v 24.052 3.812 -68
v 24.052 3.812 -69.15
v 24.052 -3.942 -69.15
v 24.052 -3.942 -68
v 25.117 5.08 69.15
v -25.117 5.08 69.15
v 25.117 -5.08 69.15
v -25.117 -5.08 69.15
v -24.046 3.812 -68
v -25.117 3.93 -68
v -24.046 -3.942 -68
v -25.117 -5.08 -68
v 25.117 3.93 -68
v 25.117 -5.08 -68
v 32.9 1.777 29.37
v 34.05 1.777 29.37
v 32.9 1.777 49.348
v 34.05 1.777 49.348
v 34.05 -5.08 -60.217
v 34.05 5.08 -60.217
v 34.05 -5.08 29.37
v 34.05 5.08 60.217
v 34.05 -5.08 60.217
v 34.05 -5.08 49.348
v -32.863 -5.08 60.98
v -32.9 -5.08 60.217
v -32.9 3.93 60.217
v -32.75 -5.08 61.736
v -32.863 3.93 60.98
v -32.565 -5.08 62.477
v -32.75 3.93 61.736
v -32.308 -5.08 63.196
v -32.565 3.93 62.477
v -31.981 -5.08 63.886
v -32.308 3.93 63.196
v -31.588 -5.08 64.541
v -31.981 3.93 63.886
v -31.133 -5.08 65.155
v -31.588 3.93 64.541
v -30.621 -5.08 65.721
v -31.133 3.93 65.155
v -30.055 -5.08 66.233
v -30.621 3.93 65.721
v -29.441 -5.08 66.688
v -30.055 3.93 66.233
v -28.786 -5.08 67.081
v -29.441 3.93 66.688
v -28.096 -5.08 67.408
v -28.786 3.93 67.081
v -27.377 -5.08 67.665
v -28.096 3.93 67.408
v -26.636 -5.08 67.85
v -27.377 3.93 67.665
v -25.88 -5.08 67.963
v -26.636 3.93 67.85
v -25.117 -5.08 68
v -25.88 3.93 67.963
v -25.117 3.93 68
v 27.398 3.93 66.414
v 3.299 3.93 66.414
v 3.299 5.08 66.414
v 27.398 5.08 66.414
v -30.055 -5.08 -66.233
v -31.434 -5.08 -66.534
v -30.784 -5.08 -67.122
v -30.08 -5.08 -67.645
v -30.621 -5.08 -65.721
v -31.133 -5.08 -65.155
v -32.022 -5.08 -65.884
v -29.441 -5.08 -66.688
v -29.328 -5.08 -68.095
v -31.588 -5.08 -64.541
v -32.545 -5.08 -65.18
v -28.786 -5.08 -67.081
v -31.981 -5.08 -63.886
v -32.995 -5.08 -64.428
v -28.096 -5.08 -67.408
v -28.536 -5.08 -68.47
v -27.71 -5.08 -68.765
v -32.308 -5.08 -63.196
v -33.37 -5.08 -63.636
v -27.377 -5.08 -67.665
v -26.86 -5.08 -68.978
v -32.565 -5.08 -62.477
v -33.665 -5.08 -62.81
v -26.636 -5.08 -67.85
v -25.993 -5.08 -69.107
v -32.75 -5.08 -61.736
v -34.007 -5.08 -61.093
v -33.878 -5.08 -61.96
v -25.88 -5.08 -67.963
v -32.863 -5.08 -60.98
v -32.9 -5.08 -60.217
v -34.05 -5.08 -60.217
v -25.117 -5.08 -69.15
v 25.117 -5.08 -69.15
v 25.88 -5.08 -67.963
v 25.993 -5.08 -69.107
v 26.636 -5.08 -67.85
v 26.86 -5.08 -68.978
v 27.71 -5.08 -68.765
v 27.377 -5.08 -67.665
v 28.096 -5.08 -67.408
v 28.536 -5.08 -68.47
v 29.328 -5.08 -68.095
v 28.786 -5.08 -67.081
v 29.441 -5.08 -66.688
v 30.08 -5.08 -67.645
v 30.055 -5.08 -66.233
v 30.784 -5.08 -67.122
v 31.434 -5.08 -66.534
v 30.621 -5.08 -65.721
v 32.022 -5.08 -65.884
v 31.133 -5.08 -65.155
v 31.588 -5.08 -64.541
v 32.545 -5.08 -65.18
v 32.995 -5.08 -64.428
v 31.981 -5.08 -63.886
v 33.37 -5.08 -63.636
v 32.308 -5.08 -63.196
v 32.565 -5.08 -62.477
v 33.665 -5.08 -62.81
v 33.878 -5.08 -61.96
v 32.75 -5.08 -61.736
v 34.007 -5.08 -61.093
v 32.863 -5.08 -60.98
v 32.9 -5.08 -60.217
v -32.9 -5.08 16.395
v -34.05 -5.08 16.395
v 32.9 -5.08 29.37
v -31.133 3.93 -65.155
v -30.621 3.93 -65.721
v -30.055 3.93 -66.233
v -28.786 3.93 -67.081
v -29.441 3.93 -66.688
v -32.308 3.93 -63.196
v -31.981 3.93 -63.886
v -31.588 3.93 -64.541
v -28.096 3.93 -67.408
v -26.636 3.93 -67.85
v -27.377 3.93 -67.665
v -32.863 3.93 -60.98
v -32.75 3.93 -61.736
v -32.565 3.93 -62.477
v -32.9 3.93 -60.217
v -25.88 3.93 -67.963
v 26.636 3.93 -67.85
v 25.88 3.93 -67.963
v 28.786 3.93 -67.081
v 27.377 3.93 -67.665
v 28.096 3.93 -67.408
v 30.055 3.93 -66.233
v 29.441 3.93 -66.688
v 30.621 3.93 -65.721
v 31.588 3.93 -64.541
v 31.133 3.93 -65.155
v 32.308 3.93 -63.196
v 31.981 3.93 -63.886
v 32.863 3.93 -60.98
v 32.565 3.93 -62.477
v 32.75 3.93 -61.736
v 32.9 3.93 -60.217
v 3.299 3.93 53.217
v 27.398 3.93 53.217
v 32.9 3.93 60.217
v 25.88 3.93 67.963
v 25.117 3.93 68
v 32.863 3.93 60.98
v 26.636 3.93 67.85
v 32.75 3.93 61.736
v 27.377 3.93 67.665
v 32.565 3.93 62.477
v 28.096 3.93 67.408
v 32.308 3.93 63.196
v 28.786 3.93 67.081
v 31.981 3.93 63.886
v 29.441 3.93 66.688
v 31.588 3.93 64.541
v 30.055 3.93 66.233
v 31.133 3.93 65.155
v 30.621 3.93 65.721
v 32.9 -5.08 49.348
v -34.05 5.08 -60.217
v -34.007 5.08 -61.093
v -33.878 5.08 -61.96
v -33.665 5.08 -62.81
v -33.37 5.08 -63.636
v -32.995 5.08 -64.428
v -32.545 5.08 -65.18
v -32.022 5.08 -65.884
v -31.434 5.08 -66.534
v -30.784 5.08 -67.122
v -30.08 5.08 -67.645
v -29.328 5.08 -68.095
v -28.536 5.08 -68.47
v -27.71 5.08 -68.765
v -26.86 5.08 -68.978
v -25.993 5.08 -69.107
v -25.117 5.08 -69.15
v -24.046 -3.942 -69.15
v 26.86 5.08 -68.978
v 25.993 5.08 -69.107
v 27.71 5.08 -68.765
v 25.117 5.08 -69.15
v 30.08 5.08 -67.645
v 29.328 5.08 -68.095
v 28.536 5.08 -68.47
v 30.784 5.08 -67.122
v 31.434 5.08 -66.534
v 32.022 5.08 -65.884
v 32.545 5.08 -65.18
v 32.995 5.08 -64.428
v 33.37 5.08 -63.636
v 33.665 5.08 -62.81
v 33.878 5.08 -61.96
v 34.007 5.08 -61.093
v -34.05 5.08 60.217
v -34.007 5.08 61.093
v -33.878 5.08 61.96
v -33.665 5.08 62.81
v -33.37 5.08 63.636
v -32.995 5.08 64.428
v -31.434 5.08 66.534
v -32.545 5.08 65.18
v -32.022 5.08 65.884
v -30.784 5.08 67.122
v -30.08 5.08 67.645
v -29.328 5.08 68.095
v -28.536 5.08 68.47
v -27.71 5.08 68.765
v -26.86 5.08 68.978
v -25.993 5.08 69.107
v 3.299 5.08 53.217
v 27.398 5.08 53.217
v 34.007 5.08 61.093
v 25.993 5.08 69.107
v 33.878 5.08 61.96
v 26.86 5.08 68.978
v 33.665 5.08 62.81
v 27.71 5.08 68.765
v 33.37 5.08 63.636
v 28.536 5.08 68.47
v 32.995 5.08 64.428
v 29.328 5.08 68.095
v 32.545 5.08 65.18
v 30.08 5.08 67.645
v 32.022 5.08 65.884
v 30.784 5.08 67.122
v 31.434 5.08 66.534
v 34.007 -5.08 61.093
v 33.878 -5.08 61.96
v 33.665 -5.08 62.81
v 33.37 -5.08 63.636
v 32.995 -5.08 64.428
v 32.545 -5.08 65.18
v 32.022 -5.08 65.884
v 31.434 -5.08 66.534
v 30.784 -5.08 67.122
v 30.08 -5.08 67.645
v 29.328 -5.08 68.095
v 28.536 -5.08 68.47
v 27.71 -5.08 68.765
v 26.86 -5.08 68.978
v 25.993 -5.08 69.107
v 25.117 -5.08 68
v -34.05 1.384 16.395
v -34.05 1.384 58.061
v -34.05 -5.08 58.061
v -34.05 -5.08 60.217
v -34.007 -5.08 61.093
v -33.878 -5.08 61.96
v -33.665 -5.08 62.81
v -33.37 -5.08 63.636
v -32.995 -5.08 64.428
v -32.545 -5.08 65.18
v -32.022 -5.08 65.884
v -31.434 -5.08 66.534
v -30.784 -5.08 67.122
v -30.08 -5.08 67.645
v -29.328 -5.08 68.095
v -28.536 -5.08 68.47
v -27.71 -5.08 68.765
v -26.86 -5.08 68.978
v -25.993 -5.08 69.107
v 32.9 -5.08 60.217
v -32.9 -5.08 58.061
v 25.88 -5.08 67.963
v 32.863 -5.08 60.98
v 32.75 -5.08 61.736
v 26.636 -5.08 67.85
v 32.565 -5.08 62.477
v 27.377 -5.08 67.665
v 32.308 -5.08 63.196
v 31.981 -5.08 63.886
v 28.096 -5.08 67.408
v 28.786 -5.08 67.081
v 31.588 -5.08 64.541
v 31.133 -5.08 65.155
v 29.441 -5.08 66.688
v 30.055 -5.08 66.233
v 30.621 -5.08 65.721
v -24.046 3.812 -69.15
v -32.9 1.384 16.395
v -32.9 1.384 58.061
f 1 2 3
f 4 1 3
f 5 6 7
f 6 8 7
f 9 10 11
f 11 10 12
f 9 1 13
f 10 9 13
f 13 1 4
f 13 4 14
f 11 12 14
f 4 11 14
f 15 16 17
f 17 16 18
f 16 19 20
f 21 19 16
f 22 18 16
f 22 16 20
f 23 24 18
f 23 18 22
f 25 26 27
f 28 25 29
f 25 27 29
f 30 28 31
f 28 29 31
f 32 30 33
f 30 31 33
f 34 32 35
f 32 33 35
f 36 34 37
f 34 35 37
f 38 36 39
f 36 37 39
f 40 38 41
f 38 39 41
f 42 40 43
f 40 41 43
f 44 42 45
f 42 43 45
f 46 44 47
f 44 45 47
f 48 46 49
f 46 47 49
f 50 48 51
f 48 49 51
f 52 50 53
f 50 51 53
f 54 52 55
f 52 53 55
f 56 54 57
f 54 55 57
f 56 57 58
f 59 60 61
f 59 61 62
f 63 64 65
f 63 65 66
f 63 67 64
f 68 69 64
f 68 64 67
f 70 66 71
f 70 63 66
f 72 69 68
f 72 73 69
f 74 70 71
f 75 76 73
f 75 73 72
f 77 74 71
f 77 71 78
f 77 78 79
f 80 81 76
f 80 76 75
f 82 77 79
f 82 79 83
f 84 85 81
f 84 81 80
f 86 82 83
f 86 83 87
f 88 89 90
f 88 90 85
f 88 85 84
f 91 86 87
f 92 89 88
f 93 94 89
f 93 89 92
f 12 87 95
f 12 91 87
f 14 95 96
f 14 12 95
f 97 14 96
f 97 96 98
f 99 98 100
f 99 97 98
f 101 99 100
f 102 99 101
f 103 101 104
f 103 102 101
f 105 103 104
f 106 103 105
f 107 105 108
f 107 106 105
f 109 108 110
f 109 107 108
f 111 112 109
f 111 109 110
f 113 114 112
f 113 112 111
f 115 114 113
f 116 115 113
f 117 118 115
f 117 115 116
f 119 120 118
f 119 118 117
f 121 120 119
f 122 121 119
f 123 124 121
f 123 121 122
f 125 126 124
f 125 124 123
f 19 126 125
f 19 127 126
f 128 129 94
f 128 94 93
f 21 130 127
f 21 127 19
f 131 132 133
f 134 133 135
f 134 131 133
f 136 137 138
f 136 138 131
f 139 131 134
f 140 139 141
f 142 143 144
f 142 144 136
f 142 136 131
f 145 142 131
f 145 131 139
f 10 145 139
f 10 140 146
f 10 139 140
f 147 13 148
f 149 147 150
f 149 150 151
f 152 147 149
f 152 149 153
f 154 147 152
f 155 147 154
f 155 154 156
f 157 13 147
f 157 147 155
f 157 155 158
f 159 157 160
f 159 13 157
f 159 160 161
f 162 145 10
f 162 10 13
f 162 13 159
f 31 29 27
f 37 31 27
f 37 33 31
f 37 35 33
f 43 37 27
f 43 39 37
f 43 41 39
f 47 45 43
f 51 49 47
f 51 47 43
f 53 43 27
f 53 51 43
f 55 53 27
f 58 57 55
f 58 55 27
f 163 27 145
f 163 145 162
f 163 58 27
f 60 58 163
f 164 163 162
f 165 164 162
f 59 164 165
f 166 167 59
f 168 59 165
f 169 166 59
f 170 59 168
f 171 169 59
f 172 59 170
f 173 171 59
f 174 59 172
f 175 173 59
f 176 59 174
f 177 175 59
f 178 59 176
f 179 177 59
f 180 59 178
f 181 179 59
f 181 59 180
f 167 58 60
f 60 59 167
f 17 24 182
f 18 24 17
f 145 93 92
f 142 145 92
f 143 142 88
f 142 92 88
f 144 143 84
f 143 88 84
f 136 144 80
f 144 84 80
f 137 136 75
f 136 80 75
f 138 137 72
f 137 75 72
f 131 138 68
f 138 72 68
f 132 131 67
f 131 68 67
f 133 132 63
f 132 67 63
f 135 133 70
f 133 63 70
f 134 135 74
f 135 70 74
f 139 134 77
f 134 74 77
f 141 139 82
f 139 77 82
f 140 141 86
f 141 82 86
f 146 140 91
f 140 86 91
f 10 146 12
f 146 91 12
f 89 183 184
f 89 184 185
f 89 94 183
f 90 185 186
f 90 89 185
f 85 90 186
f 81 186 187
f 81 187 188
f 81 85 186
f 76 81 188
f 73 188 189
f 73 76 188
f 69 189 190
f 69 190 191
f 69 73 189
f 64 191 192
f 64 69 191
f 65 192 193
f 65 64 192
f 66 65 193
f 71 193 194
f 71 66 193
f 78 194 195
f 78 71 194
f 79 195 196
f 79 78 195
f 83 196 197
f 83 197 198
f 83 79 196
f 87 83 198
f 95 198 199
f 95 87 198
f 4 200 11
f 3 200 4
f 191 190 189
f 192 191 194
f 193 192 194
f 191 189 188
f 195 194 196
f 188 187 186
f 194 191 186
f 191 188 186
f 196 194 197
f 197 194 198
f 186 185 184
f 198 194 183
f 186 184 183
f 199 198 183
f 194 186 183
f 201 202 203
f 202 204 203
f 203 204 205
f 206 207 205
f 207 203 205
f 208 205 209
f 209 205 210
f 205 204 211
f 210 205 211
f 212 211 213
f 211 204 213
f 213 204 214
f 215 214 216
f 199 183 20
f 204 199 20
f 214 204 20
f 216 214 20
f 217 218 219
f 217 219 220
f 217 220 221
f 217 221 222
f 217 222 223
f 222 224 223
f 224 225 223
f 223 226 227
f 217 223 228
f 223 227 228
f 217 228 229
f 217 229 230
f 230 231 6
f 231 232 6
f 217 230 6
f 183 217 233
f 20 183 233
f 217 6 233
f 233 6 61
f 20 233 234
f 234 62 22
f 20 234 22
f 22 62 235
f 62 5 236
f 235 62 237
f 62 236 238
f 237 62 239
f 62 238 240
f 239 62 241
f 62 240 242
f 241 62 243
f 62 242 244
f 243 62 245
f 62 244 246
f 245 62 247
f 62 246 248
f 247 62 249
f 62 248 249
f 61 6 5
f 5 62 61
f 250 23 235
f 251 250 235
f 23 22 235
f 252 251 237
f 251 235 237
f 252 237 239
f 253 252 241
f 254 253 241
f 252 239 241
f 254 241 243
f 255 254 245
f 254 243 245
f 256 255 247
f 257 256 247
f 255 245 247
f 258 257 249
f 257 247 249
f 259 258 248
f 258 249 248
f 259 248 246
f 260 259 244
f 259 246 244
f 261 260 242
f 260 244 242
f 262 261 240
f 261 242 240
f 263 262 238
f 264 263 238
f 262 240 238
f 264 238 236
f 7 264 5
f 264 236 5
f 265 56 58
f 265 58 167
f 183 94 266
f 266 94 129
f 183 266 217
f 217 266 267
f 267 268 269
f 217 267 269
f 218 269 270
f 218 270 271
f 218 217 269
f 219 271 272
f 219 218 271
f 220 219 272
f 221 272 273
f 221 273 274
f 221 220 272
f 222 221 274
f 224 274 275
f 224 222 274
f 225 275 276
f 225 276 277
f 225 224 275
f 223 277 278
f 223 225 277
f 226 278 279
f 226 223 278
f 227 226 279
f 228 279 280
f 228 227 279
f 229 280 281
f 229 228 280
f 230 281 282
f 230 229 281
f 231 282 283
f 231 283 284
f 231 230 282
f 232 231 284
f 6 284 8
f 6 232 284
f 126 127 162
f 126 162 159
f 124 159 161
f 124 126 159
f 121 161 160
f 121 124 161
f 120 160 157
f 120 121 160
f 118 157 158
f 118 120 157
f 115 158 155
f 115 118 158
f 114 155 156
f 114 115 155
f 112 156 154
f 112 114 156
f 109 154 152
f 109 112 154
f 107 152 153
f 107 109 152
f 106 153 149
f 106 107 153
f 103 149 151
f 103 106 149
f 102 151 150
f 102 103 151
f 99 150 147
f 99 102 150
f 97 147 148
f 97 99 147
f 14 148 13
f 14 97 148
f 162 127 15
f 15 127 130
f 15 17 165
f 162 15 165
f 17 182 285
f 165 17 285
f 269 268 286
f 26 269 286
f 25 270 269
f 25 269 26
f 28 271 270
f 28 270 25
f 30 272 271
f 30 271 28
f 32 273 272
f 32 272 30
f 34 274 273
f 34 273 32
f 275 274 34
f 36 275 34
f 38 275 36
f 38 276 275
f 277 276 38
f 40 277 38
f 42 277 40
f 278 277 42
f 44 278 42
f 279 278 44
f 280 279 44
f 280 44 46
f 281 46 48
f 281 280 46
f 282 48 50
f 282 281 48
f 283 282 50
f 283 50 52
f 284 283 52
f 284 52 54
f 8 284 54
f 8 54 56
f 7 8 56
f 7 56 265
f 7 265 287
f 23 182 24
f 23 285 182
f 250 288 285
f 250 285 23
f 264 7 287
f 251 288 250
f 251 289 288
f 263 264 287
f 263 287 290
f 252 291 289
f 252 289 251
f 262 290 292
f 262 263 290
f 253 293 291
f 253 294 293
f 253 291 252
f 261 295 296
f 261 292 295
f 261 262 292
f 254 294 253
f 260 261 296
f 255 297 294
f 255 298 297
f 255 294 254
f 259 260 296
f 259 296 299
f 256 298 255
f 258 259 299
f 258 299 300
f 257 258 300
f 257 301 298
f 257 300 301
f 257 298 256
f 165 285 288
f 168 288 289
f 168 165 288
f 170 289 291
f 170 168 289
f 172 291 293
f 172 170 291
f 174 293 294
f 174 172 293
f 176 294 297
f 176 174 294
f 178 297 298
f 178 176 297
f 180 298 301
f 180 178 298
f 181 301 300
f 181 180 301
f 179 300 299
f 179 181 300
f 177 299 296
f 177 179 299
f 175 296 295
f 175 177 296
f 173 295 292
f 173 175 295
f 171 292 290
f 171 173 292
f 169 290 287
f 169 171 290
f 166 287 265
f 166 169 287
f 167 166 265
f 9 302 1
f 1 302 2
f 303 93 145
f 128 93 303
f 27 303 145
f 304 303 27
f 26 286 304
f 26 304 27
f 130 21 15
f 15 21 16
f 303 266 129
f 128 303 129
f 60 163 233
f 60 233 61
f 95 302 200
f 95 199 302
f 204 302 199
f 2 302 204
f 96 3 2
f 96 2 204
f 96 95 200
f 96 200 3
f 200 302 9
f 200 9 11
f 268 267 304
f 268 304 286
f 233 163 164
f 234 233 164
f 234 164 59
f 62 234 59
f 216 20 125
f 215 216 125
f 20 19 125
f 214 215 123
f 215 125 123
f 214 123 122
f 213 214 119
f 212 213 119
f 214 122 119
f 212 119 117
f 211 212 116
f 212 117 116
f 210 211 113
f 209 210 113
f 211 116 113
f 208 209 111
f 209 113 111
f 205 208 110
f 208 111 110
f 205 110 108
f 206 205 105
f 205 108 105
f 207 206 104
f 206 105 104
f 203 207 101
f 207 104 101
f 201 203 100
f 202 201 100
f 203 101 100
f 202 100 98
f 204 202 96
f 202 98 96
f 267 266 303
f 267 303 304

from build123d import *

# Parameters (mm, degrees)
F0_W      = 68.1
F0_H      = 138.3
F1_DEPTH  = 5.08
F2_R      = 8.93259
F3_T      = -1.15
F4_W      = 24.09836
F4_H      = 13.196725
F5_DEPTH  = 12.5
F6_W      = 48.097777
F6_H      = 7.753484
F7_DEPTH  = 12.5
F8_W      = 10.118616
F8_H      = 41.666549
F9_DEPTH  = 12.5
F10_W     = 6.856616
F10_H     = 19.977162
F11_DEPTH = 12.5


with BuildPart() as f1:
    # F0 (on Front) → F1 (new body, symmetric)
    with BuildSketch(Plane.XZ):
        Rectangle(F0_W, F0_H)
    extrude(amount=F1_DEPTH, both=True)

    # F2
    f2_edges = [f1.edges().sort_by_distance(p)[0] for p in [
        (-34.05, 0, 69.15),
        (34.05, 0, 69.15),
        (34.05, 0, -69.15),
        (-34.05, 0, -69.15),
    ]]
    fillet(f2_edges, radius=F2_R)

    # F3
    f3_openings = [f1.faces().sort_by_distance(p)[0] for p in [
        (0, -5.08, 0),
    ]]
    offset(amount=F3_T, openings=f3_openings)

    # F4 (on face) → F5 (cut, symmetric)
    with BuildSketch(Plane.XZ):
        with Locations((15.348363, 59.815576)):
            Rectangle(F4_W, F4_H)
    extrude(amount=F5_DEPTH, both=True, mode=Mode.SUBTRACT)

    # F6 (on face) → F7 (cut, symmetric)
    with BuildSketch(Plane(origin=(0, 0, -69.15), x_dir=(1, 0, 0), z_dir=(0, 0, -1))):
        with Locations((0.003194, 0.064824)):
            Rectangle(F6_W, F6_H)
    extrude(amount=F7_DEPTH, both=True, mode=Mode.SUBTRACT)

    # F8 (on face) → F9 (cut, symmetric)
    with BuildSketch(Plane(origin=(-34.05, 0, 0), x_dir=(0, -1, 0), z_dir=(-1, 0, 0))):
        with Locations((3.675346, 37.227889)):
            Rectangle(F8_W, F8_H)
    extrude(amount=F9_DEPTH, both=True, mode=Mode.SUBTRACT)

    # F10 (on face) → F11 (cut, symmetric)
    with BuildSketch(Plane.YZ.offset(34.05)):
        with Locations((-1.651692, 39.359077)):
            Rectangle(F10_W, F10_H)
    extrude(amount=F11_DEPTH, both=True, mode=Mode.SUBTRACT)


solid = f1.part
